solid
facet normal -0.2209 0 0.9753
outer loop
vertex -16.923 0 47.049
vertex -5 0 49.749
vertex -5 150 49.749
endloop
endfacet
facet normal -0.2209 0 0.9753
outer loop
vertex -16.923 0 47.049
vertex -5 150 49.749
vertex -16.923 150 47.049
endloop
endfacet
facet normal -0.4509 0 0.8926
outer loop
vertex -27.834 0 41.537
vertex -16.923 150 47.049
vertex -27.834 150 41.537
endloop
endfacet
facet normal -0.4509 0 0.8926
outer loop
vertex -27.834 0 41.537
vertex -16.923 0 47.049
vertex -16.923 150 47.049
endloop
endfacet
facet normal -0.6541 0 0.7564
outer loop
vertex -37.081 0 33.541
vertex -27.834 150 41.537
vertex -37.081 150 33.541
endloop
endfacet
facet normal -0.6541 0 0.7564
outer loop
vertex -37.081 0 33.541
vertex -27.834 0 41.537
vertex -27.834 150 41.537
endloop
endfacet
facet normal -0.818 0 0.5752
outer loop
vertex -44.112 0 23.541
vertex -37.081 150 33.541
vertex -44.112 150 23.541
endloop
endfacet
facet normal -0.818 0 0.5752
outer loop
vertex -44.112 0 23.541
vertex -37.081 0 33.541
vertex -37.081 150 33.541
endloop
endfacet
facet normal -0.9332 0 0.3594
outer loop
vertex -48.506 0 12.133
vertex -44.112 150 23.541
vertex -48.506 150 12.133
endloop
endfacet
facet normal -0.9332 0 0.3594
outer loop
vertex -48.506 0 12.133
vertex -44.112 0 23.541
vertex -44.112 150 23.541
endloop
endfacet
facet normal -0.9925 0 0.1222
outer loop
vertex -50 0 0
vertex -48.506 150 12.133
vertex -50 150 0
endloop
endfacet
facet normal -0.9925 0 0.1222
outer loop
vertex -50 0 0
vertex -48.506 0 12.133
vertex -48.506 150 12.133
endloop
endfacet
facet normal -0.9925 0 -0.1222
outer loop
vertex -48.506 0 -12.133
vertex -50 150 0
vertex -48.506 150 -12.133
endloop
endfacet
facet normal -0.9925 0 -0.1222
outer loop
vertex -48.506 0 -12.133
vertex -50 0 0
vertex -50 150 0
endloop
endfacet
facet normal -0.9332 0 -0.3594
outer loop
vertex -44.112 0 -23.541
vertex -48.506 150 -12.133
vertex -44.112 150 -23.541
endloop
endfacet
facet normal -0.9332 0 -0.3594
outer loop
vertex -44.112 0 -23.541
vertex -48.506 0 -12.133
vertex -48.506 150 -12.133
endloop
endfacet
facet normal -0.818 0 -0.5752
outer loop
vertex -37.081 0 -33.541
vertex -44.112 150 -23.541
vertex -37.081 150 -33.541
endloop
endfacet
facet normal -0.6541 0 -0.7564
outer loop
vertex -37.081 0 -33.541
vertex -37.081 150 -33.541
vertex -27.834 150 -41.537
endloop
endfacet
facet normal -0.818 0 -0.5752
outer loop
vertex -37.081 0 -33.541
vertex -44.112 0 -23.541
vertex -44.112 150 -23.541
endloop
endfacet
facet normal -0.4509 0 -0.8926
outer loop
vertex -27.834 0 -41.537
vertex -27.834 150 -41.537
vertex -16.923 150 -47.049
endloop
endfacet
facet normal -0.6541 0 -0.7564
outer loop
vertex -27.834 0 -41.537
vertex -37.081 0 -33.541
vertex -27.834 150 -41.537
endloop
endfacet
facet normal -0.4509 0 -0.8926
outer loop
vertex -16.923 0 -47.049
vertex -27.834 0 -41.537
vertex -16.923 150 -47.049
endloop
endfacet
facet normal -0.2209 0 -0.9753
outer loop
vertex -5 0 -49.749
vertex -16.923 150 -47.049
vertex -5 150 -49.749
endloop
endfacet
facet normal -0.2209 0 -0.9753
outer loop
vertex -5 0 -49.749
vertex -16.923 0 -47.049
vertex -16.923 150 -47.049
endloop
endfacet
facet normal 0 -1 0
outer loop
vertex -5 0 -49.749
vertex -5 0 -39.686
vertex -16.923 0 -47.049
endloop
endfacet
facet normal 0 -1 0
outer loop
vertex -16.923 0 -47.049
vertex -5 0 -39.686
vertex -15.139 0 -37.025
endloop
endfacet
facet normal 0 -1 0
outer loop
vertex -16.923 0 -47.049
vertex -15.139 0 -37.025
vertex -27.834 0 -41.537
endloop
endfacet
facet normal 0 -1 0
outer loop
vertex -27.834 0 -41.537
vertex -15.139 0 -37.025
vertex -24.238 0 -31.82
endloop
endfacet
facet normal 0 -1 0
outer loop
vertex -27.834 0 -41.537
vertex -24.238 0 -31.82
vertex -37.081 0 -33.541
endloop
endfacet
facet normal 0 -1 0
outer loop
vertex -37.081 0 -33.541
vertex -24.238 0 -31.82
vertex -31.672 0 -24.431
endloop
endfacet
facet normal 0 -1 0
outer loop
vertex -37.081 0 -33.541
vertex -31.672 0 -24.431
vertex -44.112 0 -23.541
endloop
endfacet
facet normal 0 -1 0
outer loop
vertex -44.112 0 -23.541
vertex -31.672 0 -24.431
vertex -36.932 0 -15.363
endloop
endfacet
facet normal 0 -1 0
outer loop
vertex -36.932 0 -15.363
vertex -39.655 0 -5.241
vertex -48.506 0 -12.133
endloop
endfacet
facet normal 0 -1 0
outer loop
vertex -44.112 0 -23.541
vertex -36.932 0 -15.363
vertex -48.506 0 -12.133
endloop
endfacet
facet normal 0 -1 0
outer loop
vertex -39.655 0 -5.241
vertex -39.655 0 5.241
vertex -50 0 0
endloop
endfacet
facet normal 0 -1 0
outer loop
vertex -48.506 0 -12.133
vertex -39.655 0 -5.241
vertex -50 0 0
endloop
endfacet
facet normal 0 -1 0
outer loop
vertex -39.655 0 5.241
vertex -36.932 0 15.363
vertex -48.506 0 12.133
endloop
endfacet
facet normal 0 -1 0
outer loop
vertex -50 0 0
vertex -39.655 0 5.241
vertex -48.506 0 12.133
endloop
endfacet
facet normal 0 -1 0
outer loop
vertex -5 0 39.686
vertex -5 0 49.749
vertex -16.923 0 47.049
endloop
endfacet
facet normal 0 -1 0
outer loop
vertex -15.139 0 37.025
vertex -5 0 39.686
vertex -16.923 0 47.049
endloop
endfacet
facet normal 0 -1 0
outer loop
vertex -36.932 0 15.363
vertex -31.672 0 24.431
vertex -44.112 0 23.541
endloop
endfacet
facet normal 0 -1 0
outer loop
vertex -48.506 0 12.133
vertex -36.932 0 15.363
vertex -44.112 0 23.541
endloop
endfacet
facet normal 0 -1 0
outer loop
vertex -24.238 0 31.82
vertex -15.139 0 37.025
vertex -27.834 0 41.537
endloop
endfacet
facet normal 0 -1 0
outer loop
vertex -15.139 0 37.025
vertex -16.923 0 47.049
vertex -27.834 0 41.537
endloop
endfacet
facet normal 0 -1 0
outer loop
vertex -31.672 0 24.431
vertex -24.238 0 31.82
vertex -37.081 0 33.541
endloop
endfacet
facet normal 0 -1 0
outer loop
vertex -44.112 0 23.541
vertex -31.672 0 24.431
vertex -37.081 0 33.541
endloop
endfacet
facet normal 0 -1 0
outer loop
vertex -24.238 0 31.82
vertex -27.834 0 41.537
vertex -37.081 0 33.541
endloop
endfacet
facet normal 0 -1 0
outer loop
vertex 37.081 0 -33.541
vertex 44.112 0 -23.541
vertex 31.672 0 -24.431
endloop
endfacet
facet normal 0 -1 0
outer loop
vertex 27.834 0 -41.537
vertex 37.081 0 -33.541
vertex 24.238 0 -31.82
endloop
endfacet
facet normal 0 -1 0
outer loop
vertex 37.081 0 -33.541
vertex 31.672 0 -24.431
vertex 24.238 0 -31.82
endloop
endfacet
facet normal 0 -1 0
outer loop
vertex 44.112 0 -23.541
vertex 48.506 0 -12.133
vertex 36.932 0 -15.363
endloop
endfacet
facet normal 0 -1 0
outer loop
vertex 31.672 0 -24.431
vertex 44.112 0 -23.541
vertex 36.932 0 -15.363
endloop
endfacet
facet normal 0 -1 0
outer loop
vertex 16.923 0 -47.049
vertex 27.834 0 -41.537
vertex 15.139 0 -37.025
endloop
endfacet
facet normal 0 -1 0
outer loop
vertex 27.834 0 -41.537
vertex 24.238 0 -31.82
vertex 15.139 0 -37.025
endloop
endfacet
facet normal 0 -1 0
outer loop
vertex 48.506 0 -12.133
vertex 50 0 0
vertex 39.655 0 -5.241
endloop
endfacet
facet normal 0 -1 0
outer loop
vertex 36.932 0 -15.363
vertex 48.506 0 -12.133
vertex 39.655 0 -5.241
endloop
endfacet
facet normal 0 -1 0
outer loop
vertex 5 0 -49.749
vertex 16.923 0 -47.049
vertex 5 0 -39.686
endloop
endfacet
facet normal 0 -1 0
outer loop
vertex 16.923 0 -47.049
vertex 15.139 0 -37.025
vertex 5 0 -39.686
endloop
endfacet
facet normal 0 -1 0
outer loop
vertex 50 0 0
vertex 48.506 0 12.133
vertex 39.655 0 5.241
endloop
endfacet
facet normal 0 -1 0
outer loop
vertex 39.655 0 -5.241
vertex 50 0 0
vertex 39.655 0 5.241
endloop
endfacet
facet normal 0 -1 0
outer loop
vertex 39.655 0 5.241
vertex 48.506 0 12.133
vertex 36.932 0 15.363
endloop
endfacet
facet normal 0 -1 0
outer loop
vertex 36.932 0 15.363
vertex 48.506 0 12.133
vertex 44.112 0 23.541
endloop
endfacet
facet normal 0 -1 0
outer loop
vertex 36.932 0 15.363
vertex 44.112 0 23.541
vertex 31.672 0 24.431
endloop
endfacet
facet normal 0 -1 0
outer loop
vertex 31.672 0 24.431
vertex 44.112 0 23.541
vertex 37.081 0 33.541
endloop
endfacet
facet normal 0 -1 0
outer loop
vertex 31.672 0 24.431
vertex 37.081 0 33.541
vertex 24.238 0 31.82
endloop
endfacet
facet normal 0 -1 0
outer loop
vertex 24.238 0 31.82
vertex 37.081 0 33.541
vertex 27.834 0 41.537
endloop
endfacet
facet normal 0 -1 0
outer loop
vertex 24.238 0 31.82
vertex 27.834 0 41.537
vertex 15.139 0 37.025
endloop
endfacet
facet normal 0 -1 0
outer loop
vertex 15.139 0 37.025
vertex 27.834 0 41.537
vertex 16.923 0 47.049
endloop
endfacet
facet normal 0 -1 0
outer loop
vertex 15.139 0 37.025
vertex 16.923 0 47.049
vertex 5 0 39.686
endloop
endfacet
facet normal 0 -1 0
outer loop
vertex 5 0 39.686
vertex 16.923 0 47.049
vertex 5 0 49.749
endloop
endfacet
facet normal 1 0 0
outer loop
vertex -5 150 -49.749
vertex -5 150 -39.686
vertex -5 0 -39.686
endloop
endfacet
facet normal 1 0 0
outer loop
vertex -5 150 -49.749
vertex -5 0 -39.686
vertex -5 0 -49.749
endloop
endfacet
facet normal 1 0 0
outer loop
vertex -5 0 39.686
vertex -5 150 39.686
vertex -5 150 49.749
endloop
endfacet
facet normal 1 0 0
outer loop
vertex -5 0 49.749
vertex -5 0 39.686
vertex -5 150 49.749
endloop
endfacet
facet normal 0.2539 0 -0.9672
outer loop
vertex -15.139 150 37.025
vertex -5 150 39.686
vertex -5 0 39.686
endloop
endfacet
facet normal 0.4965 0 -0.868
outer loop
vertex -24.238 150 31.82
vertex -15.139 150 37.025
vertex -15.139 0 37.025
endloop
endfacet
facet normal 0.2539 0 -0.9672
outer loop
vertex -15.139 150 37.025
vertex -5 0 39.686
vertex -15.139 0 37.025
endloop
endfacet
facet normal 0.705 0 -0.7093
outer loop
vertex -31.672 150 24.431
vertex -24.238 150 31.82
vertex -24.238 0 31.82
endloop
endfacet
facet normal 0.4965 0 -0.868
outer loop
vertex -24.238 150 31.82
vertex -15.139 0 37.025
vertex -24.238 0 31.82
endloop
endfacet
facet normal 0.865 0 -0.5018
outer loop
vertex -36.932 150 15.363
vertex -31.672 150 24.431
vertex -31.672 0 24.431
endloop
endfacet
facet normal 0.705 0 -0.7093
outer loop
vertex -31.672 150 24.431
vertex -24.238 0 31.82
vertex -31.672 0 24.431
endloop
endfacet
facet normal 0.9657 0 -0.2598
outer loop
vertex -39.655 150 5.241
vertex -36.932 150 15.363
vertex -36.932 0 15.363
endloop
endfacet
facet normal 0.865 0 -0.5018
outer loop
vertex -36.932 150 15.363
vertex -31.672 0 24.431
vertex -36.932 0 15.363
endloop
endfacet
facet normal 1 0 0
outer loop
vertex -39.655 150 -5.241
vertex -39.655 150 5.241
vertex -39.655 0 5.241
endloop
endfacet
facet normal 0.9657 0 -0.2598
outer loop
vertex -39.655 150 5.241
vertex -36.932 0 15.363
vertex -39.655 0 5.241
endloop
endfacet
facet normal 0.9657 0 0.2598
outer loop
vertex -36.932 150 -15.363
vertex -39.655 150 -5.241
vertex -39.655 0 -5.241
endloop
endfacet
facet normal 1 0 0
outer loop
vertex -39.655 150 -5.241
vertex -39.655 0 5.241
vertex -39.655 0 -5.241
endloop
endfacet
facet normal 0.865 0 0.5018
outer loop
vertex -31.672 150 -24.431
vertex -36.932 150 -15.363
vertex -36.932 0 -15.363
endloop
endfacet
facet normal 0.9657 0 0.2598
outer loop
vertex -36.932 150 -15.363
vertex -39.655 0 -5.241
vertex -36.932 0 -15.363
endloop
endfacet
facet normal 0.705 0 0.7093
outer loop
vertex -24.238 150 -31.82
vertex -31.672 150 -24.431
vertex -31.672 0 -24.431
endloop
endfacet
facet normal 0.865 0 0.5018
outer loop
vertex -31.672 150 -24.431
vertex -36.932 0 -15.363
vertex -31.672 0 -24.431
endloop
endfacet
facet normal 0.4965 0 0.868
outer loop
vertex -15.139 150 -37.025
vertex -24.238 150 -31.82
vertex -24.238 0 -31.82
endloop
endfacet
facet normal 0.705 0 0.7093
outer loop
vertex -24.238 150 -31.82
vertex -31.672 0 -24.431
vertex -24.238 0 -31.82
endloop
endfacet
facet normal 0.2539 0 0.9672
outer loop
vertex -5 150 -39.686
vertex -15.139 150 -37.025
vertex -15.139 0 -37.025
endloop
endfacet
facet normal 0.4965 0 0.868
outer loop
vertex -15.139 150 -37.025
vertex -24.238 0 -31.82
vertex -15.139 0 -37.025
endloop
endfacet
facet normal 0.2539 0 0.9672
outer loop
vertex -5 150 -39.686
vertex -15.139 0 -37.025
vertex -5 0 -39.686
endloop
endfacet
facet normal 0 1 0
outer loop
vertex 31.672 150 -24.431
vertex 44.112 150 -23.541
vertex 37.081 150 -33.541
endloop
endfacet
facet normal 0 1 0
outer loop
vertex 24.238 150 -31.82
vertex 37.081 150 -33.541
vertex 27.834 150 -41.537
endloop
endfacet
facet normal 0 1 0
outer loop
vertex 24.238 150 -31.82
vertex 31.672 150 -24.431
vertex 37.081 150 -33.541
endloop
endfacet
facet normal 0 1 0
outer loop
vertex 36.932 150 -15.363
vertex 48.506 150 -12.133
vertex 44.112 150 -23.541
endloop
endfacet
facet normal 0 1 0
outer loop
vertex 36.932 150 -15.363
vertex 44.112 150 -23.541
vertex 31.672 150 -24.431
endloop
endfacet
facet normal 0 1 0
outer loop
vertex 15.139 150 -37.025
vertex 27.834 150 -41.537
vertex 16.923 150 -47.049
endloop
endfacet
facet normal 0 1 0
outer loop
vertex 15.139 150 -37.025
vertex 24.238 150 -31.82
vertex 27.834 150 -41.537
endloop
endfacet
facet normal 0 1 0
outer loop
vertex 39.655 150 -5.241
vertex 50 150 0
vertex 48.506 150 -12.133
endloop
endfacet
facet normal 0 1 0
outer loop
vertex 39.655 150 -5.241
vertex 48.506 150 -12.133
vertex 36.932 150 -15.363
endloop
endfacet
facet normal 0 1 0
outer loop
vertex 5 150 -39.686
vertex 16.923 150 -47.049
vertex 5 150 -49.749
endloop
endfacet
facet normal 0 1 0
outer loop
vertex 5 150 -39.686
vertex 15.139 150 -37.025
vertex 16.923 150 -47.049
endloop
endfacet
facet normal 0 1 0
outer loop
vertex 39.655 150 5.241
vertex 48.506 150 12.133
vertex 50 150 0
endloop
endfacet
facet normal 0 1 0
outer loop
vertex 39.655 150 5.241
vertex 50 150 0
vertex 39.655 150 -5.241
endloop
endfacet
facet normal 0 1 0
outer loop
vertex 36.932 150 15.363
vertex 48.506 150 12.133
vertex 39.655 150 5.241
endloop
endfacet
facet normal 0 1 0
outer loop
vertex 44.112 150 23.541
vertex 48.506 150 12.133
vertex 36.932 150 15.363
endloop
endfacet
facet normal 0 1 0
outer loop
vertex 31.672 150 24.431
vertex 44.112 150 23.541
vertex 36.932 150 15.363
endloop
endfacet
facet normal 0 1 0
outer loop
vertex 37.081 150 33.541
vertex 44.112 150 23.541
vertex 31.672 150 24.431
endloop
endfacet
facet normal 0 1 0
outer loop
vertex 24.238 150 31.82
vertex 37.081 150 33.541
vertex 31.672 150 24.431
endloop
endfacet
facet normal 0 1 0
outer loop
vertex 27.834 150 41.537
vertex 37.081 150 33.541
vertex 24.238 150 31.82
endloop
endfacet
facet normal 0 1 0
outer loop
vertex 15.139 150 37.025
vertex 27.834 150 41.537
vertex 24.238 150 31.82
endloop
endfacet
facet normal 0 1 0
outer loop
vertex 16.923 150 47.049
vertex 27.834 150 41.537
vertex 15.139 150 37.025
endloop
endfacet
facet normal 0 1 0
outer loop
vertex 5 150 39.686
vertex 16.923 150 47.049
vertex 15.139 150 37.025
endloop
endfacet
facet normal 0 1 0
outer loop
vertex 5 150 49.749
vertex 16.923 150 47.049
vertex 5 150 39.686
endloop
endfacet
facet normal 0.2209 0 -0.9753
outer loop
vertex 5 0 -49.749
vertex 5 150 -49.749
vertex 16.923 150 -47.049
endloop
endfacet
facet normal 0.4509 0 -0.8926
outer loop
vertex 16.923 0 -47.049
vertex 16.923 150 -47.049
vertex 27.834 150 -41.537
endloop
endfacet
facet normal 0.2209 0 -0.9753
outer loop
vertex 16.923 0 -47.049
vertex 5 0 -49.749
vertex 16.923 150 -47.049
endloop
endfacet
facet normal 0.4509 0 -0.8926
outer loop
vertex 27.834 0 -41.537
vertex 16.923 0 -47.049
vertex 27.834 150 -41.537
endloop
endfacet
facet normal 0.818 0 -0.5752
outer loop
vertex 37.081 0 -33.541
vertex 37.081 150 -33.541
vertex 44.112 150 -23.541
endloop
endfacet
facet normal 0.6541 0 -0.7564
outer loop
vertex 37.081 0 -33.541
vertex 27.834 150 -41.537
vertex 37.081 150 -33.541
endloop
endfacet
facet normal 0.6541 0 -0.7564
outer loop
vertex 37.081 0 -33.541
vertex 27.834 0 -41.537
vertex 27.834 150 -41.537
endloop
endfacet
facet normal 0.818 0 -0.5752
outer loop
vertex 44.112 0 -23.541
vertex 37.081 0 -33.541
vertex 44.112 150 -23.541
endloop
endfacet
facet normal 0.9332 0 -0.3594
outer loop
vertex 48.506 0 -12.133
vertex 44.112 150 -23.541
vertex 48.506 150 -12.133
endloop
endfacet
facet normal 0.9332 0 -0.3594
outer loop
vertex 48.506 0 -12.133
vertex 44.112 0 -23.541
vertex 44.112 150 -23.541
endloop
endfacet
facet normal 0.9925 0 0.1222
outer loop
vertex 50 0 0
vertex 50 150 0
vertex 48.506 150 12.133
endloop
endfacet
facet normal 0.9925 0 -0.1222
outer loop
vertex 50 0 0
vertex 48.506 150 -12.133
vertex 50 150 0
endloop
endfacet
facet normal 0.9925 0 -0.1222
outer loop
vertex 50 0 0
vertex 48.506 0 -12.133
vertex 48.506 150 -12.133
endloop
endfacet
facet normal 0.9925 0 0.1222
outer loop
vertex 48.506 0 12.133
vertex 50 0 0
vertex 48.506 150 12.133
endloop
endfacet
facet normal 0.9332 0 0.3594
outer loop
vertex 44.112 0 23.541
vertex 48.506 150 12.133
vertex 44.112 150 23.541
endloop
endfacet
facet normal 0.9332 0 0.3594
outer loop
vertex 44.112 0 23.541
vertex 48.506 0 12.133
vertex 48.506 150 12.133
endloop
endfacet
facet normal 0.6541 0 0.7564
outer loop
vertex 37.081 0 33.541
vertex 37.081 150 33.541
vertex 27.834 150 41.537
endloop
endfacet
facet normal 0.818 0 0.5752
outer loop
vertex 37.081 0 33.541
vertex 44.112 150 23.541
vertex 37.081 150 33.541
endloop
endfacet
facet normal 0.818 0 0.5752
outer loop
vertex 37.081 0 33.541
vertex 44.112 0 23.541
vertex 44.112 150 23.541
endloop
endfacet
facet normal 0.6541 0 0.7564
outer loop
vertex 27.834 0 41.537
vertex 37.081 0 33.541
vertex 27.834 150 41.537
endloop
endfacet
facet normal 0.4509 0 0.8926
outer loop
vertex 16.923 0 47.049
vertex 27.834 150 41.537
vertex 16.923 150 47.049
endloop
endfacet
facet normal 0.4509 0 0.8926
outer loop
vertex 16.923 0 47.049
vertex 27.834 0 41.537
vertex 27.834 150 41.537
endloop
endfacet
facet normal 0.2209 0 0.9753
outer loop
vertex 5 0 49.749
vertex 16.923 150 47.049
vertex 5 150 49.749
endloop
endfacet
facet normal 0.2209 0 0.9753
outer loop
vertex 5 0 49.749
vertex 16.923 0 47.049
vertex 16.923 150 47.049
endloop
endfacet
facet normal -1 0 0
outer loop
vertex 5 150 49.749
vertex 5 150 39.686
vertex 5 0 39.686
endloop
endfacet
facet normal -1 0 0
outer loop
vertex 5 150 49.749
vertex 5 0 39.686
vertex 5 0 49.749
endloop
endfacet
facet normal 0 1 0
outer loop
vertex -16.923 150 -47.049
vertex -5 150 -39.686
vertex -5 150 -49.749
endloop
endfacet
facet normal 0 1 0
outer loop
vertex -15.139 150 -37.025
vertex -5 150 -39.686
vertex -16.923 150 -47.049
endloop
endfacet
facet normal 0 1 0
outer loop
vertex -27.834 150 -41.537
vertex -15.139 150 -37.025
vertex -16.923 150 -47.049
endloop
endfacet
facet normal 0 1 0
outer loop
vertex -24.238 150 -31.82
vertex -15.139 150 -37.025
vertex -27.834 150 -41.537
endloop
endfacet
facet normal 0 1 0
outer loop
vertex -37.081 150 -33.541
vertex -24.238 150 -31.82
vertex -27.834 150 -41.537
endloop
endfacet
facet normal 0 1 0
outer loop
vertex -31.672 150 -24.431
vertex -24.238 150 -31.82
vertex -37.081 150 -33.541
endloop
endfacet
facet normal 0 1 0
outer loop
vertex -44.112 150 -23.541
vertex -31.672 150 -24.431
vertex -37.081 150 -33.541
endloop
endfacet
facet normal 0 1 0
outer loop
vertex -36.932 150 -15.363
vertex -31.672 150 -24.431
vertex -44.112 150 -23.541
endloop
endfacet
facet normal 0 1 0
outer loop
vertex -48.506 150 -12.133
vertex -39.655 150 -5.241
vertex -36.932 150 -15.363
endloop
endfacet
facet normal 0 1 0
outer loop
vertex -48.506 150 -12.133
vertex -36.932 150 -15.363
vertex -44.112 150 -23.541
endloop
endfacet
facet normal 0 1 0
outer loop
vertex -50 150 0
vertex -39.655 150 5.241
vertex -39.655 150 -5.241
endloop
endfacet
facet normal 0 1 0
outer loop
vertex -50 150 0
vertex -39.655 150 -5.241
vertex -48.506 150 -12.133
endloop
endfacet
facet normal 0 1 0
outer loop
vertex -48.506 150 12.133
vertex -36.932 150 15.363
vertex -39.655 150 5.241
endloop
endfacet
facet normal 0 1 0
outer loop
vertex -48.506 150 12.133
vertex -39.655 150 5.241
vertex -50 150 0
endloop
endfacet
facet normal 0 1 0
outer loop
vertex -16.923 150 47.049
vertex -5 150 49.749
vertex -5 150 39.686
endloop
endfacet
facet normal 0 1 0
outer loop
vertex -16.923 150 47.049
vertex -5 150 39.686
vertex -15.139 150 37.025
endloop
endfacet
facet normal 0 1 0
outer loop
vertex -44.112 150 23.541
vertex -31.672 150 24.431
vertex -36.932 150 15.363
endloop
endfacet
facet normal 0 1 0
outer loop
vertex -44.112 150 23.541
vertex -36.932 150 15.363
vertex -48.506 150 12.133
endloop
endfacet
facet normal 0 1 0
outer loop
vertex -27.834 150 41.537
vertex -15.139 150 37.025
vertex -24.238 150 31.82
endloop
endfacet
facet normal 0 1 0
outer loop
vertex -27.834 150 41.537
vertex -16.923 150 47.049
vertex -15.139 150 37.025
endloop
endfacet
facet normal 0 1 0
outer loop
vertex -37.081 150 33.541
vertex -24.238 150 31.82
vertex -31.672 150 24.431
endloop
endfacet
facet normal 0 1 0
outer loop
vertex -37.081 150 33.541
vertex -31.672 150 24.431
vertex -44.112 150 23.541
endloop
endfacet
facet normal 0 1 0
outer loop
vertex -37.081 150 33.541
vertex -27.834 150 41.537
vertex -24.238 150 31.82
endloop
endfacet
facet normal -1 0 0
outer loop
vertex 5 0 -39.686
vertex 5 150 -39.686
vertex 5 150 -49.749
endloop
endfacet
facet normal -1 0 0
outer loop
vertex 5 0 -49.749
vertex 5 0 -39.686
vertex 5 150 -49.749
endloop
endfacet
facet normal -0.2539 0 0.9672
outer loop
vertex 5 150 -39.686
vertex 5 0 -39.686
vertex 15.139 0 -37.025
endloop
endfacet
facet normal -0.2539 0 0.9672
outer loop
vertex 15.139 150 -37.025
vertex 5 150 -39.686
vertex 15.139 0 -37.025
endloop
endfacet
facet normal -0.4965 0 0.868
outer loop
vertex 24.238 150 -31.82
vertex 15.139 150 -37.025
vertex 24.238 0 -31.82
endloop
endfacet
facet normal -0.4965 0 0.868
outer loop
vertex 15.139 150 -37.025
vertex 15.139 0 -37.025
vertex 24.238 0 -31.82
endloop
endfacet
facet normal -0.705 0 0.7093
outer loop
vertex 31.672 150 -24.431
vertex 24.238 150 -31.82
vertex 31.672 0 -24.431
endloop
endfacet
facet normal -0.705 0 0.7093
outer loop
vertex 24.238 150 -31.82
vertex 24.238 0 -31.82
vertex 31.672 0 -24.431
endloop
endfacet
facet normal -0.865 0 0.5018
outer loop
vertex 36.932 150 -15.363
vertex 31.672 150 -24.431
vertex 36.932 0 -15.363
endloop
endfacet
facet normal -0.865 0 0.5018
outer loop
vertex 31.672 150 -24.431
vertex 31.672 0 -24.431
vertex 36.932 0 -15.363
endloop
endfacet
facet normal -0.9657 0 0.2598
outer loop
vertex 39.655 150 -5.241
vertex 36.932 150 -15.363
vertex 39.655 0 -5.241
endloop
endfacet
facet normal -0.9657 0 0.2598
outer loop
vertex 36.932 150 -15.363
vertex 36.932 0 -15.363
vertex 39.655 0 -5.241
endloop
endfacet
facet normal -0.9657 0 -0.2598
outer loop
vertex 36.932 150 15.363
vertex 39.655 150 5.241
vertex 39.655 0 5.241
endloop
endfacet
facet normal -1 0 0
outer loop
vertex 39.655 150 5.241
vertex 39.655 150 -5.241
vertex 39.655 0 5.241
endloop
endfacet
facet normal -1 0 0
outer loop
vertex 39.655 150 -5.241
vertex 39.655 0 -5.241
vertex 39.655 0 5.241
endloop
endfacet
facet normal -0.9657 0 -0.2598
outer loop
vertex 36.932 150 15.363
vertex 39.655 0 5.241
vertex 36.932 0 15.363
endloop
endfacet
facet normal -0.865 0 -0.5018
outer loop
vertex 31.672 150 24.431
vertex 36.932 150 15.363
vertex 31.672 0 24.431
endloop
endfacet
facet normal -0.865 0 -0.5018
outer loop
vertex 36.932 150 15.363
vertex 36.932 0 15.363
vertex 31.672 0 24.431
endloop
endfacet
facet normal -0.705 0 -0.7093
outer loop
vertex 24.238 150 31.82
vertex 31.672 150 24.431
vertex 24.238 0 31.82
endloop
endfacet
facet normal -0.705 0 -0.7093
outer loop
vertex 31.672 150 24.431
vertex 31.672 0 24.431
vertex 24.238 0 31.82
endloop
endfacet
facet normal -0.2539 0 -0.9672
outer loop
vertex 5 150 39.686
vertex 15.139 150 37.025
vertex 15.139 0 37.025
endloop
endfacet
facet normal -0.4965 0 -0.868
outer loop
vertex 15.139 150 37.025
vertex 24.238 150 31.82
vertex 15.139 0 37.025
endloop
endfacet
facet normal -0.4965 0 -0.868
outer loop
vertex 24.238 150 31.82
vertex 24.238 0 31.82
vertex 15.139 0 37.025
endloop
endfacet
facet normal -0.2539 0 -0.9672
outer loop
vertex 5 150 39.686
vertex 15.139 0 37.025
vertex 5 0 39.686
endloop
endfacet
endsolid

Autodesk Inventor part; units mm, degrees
ref_plane "YZ Plane" through (0, 0, 0) normal (1, 0, 0) x (0, 1, 0)
ref_plane "XZ Plane" through (0, 0, 0) normal (0, 1, 0) x (-1, 0, 0)
ref_plane "XY Plane" through (0, 0, 0) normal (0, 0, 1) x (1, 0, 0)
sketch "Sketch1" plane through (0, 0, 0) normal (0, 1, 0) x (-1, 0, 0)
  circle A0 centre (0, 0) radius 50
  circle A1 centre (0, 0) radius 40
  line L0 (0, 50) -> (0, -50)
  line L1 (0, 0) -> (5, 0)
  line L2 (0, 0) -> (-5, 0)
  line L3 (5, 0) -> (5, -49.7494)
  line L4 (-5, 0) -> (-5, -49.7494)
  line L5 (5, 0) -> (5, 49.7494)
  line L6 (-5, 0) -> (-5, 49.7494)
  point P0 (-5, 39.6863)
  point P1 (-5, -39.6863)
  point P2 (5, 39.6863)
  point P3 (5, -39.6863)
  dimension "d0" = 100
  dimension "d1" = 80
  dimension "d2" = 5
  dimension "d3" = 5
extrude "Extrusion1" add sketch "Sketch1" along normal blind 150 contours A0 L3 A1 L5 | L6 A1 L4 A0
properties part number "Forearm"
